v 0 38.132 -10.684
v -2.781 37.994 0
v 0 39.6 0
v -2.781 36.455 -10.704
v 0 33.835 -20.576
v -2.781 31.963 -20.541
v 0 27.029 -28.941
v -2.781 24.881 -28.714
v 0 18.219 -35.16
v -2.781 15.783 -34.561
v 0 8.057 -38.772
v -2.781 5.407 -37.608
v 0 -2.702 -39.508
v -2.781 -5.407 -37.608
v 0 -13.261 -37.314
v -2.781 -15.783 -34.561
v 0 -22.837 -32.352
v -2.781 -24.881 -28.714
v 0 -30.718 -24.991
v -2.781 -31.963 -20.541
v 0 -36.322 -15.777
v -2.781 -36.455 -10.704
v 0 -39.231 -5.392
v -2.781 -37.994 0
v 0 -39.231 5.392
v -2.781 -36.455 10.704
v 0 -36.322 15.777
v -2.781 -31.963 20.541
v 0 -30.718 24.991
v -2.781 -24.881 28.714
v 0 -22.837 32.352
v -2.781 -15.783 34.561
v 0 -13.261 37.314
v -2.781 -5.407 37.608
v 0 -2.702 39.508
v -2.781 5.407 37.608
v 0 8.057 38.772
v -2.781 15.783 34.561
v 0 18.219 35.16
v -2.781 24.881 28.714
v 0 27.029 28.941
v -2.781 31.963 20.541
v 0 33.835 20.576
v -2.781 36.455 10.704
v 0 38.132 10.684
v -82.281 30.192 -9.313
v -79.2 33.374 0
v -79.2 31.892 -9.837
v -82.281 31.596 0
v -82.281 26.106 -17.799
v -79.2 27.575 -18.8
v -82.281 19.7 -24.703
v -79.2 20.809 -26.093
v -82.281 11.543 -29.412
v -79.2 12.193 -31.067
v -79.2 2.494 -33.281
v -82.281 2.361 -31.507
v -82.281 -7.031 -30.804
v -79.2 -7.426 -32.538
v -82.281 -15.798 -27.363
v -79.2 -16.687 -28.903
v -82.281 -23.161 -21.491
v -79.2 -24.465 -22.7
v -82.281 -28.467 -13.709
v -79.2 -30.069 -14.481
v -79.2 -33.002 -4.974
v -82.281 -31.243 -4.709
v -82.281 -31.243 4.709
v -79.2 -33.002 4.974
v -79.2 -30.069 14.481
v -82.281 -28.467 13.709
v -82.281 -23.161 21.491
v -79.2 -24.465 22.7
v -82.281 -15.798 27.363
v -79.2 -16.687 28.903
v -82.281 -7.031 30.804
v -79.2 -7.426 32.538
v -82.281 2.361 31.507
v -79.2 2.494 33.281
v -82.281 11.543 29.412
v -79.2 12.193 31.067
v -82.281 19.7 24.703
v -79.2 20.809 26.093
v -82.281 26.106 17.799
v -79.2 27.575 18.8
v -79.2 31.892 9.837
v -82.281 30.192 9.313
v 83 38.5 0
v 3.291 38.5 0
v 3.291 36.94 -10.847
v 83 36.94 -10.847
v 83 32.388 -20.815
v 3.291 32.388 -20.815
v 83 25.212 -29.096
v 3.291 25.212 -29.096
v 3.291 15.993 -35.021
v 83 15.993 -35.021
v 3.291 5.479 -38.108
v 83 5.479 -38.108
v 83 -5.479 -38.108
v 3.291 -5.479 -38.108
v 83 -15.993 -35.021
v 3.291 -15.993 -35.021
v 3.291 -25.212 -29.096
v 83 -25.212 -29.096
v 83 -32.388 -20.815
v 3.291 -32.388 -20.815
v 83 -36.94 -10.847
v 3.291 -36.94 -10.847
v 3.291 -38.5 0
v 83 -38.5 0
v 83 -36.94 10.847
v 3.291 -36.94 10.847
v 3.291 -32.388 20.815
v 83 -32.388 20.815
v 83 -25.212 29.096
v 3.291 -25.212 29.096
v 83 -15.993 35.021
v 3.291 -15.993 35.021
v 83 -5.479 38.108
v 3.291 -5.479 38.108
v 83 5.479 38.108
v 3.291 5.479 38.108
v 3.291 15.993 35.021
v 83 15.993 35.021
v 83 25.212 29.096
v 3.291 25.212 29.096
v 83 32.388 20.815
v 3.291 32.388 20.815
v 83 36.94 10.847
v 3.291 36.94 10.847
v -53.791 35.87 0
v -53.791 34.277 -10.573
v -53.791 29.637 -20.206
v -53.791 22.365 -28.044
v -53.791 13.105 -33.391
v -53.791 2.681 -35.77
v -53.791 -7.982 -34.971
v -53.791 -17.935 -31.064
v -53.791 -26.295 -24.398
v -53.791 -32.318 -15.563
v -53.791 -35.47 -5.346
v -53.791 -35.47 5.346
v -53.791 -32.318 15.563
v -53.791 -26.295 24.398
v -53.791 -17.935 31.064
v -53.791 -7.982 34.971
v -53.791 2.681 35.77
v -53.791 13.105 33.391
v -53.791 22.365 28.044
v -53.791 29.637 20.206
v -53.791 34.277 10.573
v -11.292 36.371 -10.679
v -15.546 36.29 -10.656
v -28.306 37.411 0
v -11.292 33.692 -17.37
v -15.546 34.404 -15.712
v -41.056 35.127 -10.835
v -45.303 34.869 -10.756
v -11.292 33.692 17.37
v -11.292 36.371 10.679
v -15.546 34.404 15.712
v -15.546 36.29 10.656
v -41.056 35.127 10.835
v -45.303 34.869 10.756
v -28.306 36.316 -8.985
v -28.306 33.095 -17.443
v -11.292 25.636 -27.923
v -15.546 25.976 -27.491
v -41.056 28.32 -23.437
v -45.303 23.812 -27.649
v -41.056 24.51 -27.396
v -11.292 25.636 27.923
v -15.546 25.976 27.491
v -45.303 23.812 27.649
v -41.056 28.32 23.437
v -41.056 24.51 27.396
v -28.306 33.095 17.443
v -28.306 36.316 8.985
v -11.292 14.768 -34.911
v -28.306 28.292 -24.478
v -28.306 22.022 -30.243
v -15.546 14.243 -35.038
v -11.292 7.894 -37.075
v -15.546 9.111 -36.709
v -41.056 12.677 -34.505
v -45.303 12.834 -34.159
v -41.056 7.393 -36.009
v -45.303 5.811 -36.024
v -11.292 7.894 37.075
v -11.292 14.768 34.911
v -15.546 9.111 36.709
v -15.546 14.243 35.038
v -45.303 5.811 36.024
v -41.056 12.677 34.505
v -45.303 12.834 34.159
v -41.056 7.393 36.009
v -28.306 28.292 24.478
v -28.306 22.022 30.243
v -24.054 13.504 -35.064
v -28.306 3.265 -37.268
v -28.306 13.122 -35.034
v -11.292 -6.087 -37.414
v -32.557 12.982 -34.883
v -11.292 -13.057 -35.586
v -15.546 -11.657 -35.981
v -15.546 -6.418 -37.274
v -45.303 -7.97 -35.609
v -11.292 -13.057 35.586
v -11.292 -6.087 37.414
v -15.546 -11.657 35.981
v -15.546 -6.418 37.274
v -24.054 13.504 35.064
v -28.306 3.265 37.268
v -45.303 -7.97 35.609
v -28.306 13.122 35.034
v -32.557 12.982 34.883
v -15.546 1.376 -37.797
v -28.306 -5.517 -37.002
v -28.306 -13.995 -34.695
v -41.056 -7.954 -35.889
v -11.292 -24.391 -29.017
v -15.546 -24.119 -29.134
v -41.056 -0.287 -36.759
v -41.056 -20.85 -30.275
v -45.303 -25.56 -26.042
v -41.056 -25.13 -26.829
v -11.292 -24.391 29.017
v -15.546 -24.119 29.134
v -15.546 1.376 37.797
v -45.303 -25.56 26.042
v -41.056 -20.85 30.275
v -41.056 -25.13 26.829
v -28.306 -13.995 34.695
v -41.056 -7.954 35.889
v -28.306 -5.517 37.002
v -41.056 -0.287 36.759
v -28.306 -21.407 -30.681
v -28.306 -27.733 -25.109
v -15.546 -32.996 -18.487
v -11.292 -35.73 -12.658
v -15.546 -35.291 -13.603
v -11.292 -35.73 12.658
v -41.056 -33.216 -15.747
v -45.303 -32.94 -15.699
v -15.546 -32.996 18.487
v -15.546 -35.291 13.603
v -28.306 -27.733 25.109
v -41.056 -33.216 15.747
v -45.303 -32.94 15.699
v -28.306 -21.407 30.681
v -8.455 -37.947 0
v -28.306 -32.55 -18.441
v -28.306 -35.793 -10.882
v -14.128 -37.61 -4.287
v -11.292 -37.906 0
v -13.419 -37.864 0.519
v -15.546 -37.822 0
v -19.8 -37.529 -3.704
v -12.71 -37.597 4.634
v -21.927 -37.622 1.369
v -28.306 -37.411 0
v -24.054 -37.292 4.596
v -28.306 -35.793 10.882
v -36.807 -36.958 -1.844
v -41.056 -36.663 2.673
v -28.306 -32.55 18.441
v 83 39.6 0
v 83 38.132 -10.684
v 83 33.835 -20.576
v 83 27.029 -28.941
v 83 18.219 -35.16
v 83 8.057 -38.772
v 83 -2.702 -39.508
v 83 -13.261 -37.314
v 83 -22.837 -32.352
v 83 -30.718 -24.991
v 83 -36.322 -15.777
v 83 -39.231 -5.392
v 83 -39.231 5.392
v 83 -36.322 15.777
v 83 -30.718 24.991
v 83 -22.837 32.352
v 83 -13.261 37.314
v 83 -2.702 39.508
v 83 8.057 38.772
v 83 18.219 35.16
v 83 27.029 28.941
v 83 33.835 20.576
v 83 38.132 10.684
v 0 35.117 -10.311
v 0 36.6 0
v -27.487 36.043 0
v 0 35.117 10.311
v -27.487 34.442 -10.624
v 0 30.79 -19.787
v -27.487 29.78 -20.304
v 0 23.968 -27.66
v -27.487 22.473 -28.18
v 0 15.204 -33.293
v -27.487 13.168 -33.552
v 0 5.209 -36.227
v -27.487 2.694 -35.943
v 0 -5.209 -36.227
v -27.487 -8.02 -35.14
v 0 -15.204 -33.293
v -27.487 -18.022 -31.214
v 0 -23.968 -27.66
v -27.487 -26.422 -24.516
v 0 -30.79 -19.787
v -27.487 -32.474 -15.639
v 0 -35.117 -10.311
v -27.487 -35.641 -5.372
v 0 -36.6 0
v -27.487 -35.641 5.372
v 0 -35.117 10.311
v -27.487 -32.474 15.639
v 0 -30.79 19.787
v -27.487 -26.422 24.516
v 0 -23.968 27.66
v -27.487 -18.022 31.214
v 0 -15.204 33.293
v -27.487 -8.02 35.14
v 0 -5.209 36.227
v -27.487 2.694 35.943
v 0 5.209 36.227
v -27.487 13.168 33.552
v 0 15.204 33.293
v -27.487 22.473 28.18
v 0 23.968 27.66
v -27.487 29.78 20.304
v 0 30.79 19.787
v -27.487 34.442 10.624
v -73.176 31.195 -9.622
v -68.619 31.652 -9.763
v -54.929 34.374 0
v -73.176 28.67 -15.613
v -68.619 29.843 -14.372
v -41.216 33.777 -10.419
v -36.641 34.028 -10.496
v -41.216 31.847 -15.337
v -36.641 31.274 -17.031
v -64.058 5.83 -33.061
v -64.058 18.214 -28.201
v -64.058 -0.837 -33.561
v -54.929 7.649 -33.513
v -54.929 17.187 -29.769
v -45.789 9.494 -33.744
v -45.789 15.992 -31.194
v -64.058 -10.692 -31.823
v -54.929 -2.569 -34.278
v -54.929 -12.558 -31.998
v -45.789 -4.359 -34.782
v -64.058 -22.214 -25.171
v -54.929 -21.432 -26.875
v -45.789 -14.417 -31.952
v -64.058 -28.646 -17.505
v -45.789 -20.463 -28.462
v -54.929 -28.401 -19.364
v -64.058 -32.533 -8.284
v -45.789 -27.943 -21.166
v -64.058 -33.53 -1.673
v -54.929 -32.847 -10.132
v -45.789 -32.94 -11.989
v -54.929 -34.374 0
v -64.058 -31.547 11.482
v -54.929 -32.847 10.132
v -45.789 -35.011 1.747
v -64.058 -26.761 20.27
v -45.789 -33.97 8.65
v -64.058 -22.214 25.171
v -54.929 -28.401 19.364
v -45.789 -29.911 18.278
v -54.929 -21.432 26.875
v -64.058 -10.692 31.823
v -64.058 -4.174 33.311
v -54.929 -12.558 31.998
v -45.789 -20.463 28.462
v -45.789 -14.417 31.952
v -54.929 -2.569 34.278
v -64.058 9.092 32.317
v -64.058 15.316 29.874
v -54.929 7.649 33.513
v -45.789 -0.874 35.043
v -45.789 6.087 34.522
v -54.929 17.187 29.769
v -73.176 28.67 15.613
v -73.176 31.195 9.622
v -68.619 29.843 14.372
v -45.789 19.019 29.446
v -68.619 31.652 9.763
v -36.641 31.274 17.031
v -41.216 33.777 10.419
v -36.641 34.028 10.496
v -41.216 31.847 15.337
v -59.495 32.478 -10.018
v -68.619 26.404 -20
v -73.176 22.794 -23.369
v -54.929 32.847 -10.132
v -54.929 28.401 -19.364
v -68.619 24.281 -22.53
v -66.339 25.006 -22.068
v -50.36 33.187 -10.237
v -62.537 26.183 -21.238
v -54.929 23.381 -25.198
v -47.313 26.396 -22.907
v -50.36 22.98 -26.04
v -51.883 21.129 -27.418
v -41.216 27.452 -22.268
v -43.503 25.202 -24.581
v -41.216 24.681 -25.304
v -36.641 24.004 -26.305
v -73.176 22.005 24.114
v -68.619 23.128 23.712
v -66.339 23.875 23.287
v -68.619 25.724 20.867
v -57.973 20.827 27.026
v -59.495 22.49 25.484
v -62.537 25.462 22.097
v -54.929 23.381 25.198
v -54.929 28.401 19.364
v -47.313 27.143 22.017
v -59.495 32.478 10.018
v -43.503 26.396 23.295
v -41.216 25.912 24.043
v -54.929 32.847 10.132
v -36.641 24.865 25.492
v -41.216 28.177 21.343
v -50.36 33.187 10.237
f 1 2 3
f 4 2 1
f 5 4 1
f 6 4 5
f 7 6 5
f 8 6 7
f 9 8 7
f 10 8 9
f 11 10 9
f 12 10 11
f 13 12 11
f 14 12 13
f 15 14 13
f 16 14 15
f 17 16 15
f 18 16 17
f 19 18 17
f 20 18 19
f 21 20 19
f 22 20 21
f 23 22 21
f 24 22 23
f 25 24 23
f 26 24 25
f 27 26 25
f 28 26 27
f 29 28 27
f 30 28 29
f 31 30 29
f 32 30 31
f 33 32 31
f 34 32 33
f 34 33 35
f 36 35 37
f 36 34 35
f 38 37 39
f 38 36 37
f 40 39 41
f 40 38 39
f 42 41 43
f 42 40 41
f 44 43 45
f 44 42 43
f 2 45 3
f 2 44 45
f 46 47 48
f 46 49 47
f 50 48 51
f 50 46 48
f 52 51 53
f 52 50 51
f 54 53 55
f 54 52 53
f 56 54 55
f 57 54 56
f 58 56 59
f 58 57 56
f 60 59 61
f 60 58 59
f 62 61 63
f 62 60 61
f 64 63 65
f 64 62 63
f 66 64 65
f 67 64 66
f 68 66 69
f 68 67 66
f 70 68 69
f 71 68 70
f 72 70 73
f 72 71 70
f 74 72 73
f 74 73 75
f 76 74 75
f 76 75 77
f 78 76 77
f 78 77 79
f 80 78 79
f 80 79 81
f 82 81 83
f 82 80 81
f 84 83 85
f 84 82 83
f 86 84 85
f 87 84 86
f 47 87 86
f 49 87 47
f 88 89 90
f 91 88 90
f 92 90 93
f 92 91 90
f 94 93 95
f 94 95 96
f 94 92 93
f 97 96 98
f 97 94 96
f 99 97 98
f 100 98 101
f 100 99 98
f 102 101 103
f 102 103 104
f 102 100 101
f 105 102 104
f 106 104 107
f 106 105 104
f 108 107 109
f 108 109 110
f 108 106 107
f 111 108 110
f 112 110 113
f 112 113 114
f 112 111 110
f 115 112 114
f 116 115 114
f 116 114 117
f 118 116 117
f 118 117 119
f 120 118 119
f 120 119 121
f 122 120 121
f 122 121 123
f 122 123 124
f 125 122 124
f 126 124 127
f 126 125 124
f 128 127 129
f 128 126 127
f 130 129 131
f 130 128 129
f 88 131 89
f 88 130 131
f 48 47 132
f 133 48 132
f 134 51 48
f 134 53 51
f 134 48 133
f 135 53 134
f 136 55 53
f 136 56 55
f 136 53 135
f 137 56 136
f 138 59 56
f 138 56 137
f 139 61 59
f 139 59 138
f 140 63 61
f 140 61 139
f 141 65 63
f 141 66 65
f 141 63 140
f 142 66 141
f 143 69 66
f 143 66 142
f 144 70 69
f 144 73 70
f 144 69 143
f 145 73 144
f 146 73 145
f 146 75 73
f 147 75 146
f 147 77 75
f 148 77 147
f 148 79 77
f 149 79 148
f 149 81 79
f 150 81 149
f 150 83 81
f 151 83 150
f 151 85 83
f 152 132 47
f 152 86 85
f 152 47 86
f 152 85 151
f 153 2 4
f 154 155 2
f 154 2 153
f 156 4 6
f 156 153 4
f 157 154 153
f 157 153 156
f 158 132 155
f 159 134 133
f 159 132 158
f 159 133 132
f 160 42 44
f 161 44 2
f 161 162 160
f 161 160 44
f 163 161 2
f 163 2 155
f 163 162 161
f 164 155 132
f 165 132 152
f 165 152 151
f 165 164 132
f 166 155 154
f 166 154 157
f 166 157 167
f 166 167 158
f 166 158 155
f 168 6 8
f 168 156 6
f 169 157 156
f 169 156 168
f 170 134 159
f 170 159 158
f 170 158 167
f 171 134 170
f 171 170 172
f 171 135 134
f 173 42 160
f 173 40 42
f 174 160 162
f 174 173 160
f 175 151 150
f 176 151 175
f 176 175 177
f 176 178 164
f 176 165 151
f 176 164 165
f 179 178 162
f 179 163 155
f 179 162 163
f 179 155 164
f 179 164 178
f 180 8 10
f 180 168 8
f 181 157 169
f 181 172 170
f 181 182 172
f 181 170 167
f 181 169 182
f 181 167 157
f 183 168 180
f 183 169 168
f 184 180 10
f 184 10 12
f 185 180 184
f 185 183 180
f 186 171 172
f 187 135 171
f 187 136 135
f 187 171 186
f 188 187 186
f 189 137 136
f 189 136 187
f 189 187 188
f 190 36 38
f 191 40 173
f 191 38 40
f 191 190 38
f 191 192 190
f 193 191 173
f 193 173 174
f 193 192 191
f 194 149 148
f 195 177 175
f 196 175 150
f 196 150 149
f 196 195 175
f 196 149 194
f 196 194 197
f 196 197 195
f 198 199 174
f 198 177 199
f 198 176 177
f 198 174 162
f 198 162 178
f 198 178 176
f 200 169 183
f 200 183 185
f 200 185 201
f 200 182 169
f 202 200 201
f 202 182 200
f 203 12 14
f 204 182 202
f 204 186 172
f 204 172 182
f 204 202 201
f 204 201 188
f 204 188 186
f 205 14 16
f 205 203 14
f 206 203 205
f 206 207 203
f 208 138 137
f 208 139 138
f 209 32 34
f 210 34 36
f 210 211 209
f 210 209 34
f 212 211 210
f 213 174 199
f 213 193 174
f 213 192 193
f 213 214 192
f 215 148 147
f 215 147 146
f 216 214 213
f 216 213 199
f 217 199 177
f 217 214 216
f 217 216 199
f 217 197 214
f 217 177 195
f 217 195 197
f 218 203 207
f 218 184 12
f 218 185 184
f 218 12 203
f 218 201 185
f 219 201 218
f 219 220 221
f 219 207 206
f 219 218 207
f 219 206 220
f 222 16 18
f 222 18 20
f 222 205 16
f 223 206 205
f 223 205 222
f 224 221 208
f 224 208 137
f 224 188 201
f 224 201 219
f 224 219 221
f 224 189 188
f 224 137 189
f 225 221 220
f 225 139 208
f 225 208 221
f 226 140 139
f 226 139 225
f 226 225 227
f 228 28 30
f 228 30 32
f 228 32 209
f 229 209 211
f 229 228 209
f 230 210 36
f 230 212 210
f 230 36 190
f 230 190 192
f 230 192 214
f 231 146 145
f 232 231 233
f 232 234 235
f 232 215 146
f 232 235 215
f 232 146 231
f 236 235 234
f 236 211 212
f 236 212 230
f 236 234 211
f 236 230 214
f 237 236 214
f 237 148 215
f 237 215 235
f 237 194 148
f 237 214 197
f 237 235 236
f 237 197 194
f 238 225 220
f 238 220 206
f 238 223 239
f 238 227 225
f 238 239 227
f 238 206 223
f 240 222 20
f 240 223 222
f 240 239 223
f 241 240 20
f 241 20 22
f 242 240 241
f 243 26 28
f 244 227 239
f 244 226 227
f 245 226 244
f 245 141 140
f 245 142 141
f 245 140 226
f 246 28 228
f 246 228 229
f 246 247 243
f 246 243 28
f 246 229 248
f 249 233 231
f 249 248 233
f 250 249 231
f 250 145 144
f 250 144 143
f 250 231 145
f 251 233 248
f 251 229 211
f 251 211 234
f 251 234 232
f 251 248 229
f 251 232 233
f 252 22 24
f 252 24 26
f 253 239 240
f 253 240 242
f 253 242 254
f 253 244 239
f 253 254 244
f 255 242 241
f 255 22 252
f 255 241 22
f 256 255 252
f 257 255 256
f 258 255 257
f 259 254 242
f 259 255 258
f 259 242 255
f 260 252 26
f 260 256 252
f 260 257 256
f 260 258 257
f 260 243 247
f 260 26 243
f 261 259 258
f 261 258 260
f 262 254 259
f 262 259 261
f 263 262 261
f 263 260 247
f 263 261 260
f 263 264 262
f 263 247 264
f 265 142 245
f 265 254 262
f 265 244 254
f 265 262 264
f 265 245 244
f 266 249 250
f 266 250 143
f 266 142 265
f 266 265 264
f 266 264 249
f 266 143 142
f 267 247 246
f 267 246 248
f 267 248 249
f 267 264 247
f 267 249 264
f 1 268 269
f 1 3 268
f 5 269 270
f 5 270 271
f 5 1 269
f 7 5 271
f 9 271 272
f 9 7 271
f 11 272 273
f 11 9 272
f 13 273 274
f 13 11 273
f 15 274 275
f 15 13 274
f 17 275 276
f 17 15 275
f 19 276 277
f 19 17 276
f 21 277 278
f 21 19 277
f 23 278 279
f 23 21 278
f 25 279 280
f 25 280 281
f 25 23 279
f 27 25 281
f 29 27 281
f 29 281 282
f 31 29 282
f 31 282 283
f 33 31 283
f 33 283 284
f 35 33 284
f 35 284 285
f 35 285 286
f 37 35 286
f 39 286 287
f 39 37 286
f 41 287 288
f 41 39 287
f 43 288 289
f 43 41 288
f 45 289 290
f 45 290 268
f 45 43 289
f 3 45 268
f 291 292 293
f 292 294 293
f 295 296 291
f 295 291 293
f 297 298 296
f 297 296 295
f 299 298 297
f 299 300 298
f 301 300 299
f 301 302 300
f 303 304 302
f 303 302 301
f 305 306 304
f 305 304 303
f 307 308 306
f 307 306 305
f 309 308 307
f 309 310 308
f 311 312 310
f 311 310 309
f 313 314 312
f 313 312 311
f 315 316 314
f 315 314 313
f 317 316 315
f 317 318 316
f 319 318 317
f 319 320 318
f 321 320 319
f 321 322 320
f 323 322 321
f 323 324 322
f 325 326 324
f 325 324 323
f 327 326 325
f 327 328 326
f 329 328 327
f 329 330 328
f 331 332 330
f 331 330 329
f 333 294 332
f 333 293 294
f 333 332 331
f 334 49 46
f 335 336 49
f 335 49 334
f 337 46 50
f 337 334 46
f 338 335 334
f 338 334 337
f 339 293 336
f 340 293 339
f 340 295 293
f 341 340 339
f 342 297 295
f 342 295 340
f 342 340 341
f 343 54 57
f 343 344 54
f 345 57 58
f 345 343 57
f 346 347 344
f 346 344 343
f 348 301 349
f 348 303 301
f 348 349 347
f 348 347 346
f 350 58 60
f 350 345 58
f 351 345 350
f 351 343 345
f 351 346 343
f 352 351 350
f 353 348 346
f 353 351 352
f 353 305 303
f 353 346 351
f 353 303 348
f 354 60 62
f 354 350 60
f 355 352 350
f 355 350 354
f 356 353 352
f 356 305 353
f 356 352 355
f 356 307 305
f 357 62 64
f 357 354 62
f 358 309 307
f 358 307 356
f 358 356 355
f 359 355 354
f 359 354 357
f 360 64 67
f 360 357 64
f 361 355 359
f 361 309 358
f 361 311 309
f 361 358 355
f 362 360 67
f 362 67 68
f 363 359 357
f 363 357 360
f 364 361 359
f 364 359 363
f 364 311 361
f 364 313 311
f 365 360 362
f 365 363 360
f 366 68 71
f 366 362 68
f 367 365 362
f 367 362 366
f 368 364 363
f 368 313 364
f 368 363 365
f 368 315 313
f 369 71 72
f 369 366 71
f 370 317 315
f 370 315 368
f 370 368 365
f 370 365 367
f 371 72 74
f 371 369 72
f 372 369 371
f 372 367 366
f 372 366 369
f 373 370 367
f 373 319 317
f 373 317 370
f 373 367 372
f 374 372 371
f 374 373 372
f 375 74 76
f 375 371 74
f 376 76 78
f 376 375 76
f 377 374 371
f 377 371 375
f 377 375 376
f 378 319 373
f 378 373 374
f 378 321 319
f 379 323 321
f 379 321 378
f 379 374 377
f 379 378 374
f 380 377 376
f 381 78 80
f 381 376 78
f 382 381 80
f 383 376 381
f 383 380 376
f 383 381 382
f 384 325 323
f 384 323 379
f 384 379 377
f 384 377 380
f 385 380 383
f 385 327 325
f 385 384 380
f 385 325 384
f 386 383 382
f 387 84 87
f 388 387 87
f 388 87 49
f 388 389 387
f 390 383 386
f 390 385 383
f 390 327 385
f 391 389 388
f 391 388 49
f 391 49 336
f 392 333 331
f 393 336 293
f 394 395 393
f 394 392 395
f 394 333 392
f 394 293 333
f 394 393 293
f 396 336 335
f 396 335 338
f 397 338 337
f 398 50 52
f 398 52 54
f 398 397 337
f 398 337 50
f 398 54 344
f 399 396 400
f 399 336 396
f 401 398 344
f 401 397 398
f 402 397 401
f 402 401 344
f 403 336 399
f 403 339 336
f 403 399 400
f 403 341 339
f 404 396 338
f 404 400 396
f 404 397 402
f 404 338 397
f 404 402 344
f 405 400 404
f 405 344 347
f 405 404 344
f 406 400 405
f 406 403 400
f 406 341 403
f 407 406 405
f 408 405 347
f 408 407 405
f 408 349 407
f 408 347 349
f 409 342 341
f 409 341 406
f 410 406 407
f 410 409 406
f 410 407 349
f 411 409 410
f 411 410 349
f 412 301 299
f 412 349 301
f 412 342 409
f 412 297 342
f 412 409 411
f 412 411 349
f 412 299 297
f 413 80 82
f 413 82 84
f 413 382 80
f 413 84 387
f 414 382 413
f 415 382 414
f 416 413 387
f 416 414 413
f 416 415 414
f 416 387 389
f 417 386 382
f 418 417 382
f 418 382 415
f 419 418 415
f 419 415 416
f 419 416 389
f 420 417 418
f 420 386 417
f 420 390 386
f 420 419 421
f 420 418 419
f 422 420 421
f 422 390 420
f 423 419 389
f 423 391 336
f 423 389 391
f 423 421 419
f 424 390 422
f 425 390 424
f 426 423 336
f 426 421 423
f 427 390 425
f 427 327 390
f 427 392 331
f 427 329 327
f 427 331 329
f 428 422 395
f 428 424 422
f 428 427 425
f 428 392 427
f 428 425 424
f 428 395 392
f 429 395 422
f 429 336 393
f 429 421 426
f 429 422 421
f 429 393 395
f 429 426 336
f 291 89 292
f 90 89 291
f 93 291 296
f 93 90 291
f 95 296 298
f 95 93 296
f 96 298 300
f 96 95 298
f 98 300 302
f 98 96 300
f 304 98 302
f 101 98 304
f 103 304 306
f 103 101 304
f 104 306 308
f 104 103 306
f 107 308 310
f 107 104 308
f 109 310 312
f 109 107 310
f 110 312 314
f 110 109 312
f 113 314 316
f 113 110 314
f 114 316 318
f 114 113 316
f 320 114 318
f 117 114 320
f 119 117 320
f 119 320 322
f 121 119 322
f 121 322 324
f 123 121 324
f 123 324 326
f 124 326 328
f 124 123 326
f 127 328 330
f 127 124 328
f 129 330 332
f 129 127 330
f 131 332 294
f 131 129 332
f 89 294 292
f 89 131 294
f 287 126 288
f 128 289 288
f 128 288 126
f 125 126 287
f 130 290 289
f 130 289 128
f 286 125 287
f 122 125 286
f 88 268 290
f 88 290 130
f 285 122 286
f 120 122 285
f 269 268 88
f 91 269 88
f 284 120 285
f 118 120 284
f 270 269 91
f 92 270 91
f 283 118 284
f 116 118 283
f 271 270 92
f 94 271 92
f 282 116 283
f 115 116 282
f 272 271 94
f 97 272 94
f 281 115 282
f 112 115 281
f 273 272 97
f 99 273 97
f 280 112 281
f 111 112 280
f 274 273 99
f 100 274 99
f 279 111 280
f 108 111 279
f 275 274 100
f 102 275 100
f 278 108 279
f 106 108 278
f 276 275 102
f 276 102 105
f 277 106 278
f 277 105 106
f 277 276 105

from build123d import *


with BuildPart() as part:
    # Sketch1 → Revolve1 (revolve)
    with BuildSketch(Plane.XY):
        with BuildLine():
            Line((83, 39.6), (0, 39.6))
            Line((0, 39.6), (-2.781127116, 37.994315511))
            ThreePointArc((-2.781127116, 37.994315511), (-41.055601699, 36.760094161), (-79.2, 33.374302495))
            Line((-79.2, 33.374302495), (-82.280577508, 31.595730241))
            ThreePointArc((-82.280577508, 31.595730241), (-41.21630791, 35.347777764), (0, 36.6))
            Line((0, 36.6), (3.290896534, 38.5))
            Line((3.290896534, 38.5), (83, 38.5))
            Line((83, 38.5), (83, 39.6))
        make_face()
    revolve(axis=Axis((0, 0, 0), (-1, 0, 0)))


solid = part.part
